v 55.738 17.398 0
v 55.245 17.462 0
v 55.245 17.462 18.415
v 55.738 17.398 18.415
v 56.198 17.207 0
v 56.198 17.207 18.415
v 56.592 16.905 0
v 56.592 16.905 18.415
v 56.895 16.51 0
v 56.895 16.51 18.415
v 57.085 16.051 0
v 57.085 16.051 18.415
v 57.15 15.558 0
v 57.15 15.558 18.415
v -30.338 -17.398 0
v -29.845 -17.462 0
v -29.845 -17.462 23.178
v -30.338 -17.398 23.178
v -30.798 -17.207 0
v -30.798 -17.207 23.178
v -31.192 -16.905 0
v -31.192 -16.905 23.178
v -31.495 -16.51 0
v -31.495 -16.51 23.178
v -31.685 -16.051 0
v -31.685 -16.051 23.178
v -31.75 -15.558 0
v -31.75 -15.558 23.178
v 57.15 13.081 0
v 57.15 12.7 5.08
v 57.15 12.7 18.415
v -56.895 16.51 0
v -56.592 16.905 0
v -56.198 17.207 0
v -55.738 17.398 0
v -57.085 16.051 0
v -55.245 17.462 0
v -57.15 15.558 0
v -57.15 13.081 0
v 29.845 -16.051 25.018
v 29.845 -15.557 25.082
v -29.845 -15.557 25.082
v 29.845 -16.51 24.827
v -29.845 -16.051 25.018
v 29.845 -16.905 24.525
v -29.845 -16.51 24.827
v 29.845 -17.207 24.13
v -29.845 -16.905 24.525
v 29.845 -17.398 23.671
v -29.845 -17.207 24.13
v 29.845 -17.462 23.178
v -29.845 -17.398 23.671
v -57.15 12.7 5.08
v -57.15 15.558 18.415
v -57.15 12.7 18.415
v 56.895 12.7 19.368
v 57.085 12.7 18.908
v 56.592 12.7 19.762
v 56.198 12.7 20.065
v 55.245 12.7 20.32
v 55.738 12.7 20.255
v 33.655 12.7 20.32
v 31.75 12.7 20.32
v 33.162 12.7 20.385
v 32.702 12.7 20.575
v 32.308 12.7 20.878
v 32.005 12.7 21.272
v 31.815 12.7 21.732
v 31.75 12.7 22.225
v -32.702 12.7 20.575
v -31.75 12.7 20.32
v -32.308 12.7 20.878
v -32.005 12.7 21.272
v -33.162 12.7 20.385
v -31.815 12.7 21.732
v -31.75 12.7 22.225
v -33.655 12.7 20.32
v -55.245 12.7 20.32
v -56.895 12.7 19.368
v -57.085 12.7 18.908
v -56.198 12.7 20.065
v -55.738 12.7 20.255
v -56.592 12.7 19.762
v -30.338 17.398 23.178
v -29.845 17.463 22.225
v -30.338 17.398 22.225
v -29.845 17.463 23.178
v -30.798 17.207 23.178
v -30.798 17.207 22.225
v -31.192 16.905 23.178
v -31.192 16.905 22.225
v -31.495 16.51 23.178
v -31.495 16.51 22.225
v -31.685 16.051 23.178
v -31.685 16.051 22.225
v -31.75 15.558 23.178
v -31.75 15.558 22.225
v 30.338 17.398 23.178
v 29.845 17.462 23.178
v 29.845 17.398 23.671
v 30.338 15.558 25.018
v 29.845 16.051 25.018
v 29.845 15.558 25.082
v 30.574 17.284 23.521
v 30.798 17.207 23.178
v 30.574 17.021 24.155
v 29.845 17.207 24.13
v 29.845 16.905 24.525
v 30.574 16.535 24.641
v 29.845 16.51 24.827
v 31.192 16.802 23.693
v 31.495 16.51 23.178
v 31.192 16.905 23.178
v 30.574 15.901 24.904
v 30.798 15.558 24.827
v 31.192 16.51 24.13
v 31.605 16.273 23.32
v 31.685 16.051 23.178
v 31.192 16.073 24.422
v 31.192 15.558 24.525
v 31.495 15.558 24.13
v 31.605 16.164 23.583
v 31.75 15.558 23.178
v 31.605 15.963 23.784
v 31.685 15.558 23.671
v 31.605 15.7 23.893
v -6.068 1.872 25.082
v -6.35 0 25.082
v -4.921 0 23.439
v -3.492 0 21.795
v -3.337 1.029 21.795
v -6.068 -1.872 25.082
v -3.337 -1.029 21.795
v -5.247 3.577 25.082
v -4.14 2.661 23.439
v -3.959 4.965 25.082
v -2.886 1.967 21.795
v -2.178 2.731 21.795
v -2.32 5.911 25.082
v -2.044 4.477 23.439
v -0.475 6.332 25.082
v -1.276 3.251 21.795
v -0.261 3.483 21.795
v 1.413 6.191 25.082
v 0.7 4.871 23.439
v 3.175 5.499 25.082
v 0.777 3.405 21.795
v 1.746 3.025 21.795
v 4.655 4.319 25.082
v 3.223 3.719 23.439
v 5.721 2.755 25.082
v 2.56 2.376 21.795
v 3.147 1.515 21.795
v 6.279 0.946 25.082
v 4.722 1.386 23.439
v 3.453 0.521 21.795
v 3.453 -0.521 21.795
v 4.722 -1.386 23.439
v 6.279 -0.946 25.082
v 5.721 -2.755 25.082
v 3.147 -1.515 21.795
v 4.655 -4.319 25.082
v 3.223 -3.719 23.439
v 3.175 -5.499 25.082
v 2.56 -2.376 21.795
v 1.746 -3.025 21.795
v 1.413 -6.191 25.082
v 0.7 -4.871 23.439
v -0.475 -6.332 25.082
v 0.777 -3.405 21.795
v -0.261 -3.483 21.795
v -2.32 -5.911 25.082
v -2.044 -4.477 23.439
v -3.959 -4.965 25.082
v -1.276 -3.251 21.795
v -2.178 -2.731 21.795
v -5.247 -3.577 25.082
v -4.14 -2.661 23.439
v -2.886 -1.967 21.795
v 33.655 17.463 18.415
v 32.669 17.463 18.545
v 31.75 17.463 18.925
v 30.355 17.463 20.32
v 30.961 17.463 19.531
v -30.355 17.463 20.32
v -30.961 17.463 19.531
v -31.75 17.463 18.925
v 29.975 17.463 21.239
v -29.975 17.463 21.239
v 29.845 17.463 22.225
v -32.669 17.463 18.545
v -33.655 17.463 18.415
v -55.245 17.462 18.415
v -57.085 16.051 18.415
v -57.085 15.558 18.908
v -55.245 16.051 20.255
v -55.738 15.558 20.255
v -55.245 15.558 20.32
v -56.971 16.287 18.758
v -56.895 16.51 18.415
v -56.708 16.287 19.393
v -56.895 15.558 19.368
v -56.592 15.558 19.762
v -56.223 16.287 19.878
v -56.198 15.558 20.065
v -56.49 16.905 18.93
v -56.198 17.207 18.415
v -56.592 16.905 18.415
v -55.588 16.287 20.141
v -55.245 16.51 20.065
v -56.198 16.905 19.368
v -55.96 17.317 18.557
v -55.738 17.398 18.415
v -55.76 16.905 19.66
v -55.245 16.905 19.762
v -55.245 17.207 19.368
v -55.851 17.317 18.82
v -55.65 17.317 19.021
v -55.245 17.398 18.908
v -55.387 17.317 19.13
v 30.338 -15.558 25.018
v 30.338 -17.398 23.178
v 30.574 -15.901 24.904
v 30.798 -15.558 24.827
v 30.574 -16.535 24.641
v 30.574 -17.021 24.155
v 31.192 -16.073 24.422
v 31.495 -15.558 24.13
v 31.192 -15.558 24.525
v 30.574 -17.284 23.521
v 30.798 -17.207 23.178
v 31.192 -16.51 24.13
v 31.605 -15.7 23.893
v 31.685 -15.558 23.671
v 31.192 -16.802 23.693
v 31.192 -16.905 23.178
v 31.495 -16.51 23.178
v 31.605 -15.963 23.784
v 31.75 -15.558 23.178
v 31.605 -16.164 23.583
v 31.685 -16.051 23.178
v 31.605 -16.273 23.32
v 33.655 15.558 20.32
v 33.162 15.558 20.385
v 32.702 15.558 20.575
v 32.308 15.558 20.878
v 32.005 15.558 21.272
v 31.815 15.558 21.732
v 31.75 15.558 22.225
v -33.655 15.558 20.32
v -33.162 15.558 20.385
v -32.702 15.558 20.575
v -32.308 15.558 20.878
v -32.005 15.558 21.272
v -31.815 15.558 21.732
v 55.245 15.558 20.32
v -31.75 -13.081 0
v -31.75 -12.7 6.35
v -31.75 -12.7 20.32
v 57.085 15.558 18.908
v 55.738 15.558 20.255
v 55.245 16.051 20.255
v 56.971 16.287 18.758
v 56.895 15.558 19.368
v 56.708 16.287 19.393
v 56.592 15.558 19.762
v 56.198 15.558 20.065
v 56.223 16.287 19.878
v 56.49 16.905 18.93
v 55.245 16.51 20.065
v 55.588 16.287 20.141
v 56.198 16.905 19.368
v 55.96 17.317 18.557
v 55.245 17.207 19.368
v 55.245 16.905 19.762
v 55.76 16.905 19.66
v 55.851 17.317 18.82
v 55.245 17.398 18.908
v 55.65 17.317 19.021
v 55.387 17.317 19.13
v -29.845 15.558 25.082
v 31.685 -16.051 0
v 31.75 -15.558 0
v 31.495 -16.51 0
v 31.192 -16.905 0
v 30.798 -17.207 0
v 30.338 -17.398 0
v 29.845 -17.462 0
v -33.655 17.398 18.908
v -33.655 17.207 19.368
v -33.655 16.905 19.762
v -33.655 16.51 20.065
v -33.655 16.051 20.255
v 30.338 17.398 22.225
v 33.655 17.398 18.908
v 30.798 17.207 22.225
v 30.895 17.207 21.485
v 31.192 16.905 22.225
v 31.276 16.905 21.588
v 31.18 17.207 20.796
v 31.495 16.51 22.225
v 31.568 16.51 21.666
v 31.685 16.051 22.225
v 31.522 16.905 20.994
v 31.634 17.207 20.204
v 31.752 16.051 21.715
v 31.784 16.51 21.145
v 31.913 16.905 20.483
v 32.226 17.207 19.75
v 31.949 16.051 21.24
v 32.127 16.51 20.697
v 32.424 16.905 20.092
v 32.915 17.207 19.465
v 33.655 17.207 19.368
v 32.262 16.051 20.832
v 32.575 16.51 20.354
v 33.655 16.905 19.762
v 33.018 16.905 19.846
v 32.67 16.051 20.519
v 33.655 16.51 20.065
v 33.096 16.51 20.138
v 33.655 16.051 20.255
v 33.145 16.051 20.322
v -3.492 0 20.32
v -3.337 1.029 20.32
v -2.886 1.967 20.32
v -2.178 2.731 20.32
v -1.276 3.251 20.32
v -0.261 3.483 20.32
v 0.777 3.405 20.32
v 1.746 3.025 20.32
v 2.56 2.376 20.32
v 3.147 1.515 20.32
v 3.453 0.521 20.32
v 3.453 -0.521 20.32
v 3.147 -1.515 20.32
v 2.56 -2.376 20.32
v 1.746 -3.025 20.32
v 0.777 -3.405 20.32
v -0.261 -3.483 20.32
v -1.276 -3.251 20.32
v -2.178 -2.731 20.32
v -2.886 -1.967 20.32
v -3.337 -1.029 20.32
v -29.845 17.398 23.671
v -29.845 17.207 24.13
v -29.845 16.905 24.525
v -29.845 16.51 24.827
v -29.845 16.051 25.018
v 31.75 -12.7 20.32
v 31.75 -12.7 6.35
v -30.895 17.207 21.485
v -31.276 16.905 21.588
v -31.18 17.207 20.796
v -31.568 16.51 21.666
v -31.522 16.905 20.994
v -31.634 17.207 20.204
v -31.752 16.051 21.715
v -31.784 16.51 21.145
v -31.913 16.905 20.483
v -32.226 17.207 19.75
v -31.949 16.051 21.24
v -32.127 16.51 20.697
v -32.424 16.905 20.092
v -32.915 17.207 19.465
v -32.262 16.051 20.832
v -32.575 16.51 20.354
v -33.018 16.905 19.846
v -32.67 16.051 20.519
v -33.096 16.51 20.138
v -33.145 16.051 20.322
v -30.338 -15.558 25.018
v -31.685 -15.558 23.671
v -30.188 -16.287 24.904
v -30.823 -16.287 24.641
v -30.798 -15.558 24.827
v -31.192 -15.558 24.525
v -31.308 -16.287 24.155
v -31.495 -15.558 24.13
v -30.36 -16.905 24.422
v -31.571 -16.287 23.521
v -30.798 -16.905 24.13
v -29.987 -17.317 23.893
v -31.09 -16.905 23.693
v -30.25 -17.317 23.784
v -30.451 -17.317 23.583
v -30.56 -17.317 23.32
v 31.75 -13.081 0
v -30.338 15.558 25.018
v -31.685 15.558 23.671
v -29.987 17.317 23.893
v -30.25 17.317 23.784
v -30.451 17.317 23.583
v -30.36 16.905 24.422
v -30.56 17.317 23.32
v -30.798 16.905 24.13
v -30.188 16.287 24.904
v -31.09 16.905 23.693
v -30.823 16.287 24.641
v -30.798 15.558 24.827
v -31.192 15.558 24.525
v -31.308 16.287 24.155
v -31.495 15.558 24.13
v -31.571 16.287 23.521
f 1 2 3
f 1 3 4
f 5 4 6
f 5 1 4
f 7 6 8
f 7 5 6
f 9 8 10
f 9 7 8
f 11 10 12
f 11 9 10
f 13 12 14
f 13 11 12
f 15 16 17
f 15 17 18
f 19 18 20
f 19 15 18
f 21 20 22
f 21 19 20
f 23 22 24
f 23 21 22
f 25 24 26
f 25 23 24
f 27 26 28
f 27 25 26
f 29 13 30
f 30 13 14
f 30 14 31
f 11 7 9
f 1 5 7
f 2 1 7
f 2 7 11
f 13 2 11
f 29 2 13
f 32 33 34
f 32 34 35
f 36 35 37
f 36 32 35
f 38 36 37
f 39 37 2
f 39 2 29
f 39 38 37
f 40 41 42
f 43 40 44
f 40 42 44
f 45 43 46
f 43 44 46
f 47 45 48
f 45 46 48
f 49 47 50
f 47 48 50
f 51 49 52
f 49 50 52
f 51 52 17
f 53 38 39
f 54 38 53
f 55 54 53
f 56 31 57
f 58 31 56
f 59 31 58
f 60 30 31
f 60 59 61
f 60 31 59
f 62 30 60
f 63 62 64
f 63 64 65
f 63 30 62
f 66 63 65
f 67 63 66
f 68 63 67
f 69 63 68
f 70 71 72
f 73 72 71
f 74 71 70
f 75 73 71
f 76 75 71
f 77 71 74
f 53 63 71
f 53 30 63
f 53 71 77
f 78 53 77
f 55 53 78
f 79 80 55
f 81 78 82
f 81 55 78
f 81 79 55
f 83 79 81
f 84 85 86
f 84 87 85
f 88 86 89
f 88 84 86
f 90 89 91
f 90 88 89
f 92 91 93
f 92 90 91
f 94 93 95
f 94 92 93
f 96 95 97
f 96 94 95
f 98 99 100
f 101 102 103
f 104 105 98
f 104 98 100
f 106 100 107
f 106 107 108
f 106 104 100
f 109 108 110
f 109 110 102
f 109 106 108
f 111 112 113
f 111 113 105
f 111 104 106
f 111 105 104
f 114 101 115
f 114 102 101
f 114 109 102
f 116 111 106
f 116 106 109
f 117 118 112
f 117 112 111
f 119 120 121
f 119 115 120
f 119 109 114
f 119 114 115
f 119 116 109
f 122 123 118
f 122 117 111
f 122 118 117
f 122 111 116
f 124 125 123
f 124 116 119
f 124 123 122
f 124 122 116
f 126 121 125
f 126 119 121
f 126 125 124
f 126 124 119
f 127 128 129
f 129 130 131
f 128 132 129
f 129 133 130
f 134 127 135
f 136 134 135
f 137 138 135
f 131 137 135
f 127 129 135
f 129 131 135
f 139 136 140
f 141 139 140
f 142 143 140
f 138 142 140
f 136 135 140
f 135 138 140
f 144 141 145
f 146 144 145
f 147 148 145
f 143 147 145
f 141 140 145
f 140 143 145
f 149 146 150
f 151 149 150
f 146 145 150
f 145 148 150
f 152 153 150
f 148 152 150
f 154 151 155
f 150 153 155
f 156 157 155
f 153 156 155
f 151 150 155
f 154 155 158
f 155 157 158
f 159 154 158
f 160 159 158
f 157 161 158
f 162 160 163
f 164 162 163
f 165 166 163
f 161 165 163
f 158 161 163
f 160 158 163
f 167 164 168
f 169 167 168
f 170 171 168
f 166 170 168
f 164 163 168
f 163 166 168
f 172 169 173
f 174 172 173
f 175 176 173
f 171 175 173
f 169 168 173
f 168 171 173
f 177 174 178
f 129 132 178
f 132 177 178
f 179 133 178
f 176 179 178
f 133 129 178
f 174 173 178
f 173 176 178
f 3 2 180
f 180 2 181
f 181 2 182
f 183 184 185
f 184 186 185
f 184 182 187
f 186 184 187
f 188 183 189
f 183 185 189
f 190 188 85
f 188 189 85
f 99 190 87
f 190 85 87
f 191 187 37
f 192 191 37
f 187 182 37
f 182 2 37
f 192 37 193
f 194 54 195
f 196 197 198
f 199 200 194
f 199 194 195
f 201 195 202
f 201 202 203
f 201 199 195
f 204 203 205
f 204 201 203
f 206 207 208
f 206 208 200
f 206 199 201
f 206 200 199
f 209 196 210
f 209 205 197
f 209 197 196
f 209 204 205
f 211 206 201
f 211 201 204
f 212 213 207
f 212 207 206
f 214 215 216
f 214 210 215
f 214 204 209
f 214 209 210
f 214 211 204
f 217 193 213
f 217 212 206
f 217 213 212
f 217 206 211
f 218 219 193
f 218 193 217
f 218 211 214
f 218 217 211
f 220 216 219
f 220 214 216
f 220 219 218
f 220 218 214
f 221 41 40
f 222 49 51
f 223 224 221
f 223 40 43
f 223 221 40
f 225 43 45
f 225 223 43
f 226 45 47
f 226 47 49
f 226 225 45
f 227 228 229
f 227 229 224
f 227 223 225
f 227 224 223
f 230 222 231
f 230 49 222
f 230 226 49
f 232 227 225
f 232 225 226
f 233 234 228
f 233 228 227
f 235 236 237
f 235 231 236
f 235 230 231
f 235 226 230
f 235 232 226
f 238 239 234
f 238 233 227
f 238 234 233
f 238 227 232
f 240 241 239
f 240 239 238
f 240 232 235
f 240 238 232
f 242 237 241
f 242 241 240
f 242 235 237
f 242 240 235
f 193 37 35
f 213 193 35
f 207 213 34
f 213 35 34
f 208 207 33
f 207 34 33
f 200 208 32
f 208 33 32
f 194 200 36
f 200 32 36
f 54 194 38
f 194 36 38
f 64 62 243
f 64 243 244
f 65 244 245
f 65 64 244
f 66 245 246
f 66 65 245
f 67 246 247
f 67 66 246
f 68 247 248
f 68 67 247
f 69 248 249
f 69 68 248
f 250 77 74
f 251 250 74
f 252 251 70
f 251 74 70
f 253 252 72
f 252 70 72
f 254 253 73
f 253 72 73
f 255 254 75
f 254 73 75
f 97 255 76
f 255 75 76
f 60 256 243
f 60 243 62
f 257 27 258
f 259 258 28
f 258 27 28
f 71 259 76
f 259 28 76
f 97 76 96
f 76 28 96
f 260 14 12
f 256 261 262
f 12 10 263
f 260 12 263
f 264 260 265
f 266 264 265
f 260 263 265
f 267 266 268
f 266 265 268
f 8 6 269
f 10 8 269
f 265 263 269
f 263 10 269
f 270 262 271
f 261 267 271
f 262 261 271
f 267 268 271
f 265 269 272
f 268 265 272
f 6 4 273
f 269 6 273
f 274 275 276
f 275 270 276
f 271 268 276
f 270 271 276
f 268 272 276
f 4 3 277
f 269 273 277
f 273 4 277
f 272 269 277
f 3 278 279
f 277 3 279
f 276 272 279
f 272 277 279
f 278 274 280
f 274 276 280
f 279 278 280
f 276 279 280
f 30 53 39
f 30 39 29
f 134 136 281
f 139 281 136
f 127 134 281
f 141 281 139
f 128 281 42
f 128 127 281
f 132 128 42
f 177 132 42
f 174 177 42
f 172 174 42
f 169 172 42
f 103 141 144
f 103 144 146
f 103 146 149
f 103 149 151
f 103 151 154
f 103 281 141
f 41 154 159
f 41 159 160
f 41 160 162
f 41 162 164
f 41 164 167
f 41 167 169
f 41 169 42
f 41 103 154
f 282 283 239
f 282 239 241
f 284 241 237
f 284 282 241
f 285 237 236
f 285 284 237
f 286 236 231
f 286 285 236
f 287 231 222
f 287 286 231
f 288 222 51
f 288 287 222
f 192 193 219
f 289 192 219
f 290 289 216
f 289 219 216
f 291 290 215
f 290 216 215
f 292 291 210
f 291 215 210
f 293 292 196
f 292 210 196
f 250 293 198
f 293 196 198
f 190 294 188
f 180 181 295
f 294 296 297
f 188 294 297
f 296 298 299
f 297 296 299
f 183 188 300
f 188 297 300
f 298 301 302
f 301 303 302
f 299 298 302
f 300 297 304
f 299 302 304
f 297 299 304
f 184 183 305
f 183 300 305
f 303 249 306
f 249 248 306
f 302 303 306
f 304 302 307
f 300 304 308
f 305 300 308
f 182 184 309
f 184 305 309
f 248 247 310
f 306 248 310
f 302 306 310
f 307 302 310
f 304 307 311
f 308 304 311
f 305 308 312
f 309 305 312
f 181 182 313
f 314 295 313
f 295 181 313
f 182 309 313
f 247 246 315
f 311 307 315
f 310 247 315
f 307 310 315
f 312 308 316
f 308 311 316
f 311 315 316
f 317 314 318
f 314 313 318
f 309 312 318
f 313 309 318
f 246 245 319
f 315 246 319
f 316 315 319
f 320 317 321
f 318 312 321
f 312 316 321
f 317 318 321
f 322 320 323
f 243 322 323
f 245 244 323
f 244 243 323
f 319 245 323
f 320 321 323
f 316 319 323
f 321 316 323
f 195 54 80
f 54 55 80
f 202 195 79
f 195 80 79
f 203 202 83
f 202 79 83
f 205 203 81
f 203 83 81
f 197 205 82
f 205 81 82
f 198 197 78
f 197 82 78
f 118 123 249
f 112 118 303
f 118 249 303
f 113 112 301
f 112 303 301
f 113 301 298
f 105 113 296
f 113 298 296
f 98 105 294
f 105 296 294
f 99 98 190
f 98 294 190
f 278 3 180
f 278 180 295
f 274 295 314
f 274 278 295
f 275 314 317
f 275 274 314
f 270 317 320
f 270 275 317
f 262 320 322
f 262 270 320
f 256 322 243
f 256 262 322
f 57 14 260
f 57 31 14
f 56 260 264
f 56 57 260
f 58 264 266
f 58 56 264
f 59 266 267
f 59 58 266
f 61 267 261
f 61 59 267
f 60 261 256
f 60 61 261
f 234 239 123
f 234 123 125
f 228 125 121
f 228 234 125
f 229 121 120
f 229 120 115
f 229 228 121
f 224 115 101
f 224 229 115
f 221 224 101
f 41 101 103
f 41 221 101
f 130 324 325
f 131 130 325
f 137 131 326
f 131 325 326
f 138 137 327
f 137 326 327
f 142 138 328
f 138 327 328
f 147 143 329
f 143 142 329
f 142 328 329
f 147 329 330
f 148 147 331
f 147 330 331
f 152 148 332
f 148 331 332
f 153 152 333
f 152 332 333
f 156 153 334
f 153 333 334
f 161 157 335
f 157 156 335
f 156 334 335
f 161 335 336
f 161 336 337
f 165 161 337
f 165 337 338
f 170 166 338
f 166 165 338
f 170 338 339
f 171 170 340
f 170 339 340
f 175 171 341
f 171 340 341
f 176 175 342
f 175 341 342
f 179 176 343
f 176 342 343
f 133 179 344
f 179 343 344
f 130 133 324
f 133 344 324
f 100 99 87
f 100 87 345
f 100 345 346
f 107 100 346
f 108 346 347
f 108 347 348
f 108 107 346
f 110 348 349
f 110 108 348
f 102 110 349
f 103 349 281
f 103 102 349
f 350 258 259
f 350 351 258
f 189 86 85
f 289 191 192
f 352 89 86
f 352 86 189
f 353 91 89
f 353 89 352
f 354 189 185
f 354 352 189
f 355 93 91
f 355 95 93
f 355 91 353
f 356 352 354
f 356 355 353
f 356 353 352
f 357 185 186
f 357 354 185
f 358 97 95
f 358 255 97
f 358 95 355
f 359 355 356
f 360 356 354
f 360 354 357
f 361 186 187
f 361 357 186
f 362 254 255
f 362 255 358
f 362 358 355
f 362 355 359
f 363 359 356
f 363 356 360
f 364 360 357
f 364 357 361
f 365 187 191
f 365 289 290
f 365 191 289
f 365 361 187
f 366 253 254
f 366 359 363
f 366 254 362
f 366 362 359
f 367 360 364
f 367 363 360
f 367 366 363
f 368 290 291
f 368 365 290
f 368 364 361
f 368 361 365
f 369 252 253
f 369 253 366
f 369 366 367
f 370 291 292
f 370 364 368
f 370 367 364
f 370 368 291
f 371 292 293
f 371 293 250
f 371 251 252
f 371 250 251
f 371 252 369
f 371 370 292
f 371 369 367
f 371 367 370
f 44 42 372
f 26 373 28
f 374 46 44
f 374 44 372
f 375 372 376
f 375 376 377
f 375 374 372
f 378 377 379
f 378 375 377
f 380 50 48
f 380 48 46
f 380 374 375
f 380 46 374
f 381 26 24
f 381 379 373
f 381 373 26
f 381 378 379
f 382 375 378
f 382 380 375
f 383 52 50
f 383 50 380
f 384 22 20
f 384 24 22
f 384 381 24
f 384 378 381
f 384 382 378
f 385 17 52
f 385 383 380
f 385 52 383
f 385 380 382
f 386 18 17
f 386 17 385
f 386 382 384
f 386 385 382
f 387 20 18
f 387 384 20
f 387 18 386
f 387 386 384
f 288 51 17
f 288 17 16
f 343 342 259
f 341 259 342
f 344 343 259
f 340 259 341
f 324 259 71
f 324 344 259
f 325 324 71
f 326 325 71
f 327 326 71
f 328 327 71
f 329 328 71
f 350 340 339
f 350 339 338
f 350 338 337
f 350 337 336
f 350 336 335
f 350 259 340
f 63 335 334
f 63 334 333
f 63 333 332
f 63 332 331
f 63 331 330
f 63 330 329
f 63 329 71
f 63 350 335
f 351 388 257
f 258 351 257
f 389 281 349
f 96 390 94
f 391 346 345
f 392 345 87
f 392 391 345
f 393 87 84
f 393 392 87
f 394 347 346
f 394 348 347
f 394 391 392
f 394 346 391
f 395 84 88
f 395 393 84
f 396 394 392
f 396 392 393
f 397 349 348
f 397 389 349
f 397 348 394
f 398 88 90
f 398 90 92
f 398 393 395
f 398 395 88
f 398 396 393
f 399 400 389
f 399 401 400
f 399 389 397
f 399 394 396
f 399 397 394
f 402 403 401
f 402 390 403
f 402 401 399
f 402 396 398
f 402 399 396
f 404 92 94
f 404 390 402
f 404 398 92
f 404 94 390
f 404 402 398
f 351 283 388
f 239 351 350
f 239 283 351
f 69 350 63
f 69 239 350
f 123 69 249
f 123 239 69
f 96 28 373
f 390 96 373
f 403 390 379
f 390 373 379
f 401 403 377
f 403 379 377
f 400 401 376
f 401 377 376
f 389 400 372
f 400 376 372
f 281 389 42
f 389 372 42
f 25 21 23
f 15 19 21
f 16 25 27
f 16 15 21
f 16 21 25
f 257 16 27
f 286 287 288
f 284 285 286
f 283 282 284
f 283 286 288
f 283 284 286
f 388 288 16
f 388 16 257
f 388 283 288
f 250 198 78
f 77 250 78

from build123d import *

# Parameters (mm, degrees)
F1_DEPTH       = 31.75
F4_D           = 6.985
F4_DEPTH       = 12.7
F4_CSINK_D     = 12.7
F4_CSINK_ANGLE = 82
F4_TIP         = 2.098505712
F5_SIZE2       = 0.381
F5_SIZE        = 6.35
F2_W           = 4.7625
F2_H           = 20.32
F6_DEPTH       = 25.4
F7_SIZE2       = 5.08
F7_SIZE        = 0.381
F8_R           = 1.905
F9_T1_DEPTH    = 23.1775
F9_T3_DEPTH    = 27.94
F9_S7_W        = 1.905
F9_S7_H        = 1.905
F9_T8_DEPTH    = 1.905
F9_S13_W       = 1.905
F9_S13_H       = 1.905
F9_T14_DEPTH   = 1.905
F9_S19_W       = 1.905
F9_S19_H       = 1.905
F9_T20_DEPTH   = 1.905
F9_S25_W       = 1.905
F9_S25_H       = 1.905
F9_T26_DEPTH   = 1.905


# Not quite as in the source:
# - a fillet or chamfer that OpenCascade refuses, or shapes differently, is made with other operations: its cross-section is extruded or revolved along the edge and cut away or added


with BuildPart() as f1:
    # F0 (on Right) → F1 (new body, symmetric)
    with BuildSketch(Plane.YZ):
        Polygon((-12.7, 0), (-12.7, 20.32), (12.7, 20.32), (12.7, 0), (17.4625, 0), (17.4625, 25.0825), (-17.4625, 25.0825), (-17.4625, 0), align=None)
    extrude(amount=F1_DEPTH, both=True)

    # F4
    with Locations(Plane.XY.offset(25.0825)):
        with Locations((0, 0)):
            CounterSinkHole(F4_D / 2, F4_CSINK_D / 2, depth=F4_DEPTH, counter_sink_angle=F4_CSINK_ANGLE)
            with Locations((0, 0, -(F4_DEPTH + F4_TIP / 2))):  # 118° drill point
                Cone(0, F4_D / 2, F4_TIP, mode=Mode.SUBTRACT)

    # F5
    f5_edges = [f1.edges().sort_by_distance(p)[0] for p in [
        (0, -12.7, 0),
    ]]
    f5_side = f1.faces().sort_by_distance((0, -12.7, 10.16))[0]
    chamfer(f5_edges, length=F5_SIZE, length2=F5_SIZE2, reference=f5_side)

    # F2 (on face) → F6 (join)
    with BuildSketch(Plane(origin=(-31.75, 0, 0), x_dir=(0, -1, 0), z_dir=(-1, 0, 0))):
        with Locations((-15.08125, 10.16)):
            Rectangle(F2_W, F2_H)
    extrude(amount=F6_DEPTH)

    # F7
    f7_edges = [f1.edges().sort_by_distance(p)[0] for p in [
        (-12.7, 12.7, 0),
    ]]
    chamfer(f7_edges, length=F7_SIZE, length2=F7_SIZE2)

    # F8
    f8_edges = [f1.edges().sort_by_distance(p)[0] for p in [
        (-31.75, 0, 25.0825),
        (-31.75, 15.08125, 20.32),
        (-57.15, 15.08125, 20.32),
        (31.75, 0, 25.0825),
        (0, 17.4625, 25.0825),
        (-31.75, 17.4625, 22.70125),
        (-44.45, 17.4625, 20.32),
        (0, -17.4625, 25.0825),
    ]]
    fillet(f8_edges, radius=F8_R)

    # F9: fillet of radius 1.905 on 4 edges, made by hand

    # F9_s2 → F9_t1 (cut)
    with BuildSketch(Plane.XY.offset(-4.7625)):
        with BuildLine():
            ThreePointArc((-55.245, 17.4625), (-56.5920384182, 16.9045384182), (-57.15, 15.5575))
            Line((-57.15, 15.5575), (-57.15, 17.4625))
            Line((-57.15, 17.4625), (-55.245, 17.4625))
        make_face()
    extrude(amount=F9_T1_DEPTH, mode=Mode.SUBTRACT)

    # F9_s4 → F9_t3 (cut)
    with BuildSketch(Plane.XY.offset(-4.7625)):
        with BuildLine():
            ThreePointArc((31.75, 15.5575), (31.1920384182, 16.9045384182), (29.845, 17.4625))
            Line((29.845, 17.4625), (31.75, 17.4625))
            Line((31.75, 17.4625), (31.75, 15.5575))
        make_face()
        with BuildLine():
            ThreePointArc((-29.845, -17.4625), (-31.1920384182, -16.9045384182), (-31.75, -15.5575))
            Line((-31.75, -15.5575), (-31.75, -17.4625))
            Line((-31.75, -17.4625), (-29.845, -17.4625))
        make_face()
        with BuildLine():
            ThreePointArc((31.75, -15.5575), (31.1920384182, -16.9045384182), (29.845, -17.4625))
            Line((29.845, -17.4625), (31.75, -17.4625))
            Line((31.75, -17.4625), (31.75, -15.5575))
        make_face()
    extrude(amount=F9_T3_DEPTH, mode=Mode.SUBTRACT)


with BuildPart() as f9_tool6:
    # F9_s7 → F9_t8 (new body)
    with BuildSketch(Plane.YZ.offset(29.845)):
        with Locations((-16.51, 24.13)):
            Rectangle(F9_S7_W, F9_S7_H)
    extrude(amount=F9_T8_DEPTH)

    # F9_s9 → F9_t10 (revolve, cut)
    with BuildSketch(Plane(origin=(29.845, -15.5575, 23.1775), x_dir=(0, 0.7071067812, -0.7071067812), z_dir=(0, -0.7071067812, -0.7071067812))):
        with BuildLine():
            ThreePointArc((0, -1.905), (1.905, 0), (0, 1.905))
            Line((0, 1.905), (0, -1.905))
        make_face()
    revolve(axis=Axis((29.845, -15.5575, 23.1775), (1, 0, 0)), mode=Mode.SUBTRACT)


with BuildPart() as f1_1:
    add(f1.part)

    # F9_t5: cut F9_tool6
    add(f9_tool6.part, mode=Mode.SUBTRACT)


with BuildPart() as f9_tool12:
    # F9_s13 → F9_t14 (new body)
    with BuildSketch(Plane.XZ.offset(15.5575)):
        with Locations((-30.7975, 24.13)):
            Rectangle(F9_S13_W, F9_S13_H)
    extrude(amount=F9_T14_DEPTH)

    # F9_s15 → F9_t16 (revolve, cut)
    with BuildSketch(Plane(origin=(-29.845, -15.5575, 23.1775), x_dir=(0.7071067812, 0, -0.7071067812), z_dir=(-0.7071067812, 0, -0.7071067812))):
        with BuildLine():
            ThreePointArc((0, -1.905), (1.905, 0), (0, 1.905))
            Line((0, 1.905), (0, -1.905))
        make_face()
    revolve(axis=Axis((-29.845, -15.5575, 23.1775), (0, -1, 0)), mode=Mode.SUBTRACT)


with BuildPart() as f1_2:
    add(f1_1.part)

    # F9_t11: cut F9_tool12
    add(f9_tool12.part, mode=Mode.SUBTRACT)


with BuildPart() as f9_tool18:
    # F9_s19 → F9_t20 (new body)
    with BuildSketch(Plane.YZ.offset(29.845)):
        with Locations((16.51, 24.13)):
            Rectangle(F9_S19_W, F9_S19_H)
    extrude(amount=F9_T20_DEPTH)

    # F9_s21 → F9_t22 (revolve, cut)
    with BuildSketch(Plane(origin=(29.845, 15.5575, 23.1775), x_dir=(0, -0.7071067812, -0.7071067812), z_dir=(0, -0.7071067812, 0.7071067812))):
        with BuildLine():
            ThreePointArc((0, -1.905), (1.905, 0), (0, 1.905))
            Line((0, 1.905), (0, -1.905))
        make_face()
    revolve(axis=Axis((29.845, 15.5575, 23.1775), (1, 0, 0)), mode=Mode.SUBTRACT)


with BuildPart() as f1_3:
    add(f1_2.part)

    # F9_t17: cut F9_tool18
    add(f9_tool18.part, mode=Mode.SUBTRACT)


with BuildPart() as f9_tool24:
    # F9_s25 → F9_t26 (new body)
    with BuildSketch(Plane.XZ.offset(-15.5575)):
        with Locations((-56.1975, 19.3675)):
            Rectangle(F9_S25_W, F9_S25_H)
    extrude(amount=-F9_T26_DEPTH)

    # F9_s27 → F9_t28 (revolve, cut)
    with BuildSketch(Plane(origin=(-55.245, 15.5575, 18.415), x_dir=(0.7071067812, 0, -0.7071067812), z_dir=(0.7071067812, 0, 0.7071067812))):
        with BuildLine():
            ThreePointArc((0, -1.905), (1.905, 0), (0, 1.905))
            Line((0, 1.905), (0, -1.905))
        make_face()
    revolve(axis=Axis((-55.245, 15.5575, 18.415), (0, 1, 0)), mode=Mode.SUBTRACT)


with BuildPart() as f1_4:
    add(f1_3.part)

    # F9_t23: cut F9_tool24
    add(f9_tool24.part, mode=Mode.SUBTRACT)

    # F10: F1 across plane


with BuildPart() as f1_5:
    add(f1_4.part)
    add(f1_4.part.mirror(Plane.YZ))


solid = f1_5.part
